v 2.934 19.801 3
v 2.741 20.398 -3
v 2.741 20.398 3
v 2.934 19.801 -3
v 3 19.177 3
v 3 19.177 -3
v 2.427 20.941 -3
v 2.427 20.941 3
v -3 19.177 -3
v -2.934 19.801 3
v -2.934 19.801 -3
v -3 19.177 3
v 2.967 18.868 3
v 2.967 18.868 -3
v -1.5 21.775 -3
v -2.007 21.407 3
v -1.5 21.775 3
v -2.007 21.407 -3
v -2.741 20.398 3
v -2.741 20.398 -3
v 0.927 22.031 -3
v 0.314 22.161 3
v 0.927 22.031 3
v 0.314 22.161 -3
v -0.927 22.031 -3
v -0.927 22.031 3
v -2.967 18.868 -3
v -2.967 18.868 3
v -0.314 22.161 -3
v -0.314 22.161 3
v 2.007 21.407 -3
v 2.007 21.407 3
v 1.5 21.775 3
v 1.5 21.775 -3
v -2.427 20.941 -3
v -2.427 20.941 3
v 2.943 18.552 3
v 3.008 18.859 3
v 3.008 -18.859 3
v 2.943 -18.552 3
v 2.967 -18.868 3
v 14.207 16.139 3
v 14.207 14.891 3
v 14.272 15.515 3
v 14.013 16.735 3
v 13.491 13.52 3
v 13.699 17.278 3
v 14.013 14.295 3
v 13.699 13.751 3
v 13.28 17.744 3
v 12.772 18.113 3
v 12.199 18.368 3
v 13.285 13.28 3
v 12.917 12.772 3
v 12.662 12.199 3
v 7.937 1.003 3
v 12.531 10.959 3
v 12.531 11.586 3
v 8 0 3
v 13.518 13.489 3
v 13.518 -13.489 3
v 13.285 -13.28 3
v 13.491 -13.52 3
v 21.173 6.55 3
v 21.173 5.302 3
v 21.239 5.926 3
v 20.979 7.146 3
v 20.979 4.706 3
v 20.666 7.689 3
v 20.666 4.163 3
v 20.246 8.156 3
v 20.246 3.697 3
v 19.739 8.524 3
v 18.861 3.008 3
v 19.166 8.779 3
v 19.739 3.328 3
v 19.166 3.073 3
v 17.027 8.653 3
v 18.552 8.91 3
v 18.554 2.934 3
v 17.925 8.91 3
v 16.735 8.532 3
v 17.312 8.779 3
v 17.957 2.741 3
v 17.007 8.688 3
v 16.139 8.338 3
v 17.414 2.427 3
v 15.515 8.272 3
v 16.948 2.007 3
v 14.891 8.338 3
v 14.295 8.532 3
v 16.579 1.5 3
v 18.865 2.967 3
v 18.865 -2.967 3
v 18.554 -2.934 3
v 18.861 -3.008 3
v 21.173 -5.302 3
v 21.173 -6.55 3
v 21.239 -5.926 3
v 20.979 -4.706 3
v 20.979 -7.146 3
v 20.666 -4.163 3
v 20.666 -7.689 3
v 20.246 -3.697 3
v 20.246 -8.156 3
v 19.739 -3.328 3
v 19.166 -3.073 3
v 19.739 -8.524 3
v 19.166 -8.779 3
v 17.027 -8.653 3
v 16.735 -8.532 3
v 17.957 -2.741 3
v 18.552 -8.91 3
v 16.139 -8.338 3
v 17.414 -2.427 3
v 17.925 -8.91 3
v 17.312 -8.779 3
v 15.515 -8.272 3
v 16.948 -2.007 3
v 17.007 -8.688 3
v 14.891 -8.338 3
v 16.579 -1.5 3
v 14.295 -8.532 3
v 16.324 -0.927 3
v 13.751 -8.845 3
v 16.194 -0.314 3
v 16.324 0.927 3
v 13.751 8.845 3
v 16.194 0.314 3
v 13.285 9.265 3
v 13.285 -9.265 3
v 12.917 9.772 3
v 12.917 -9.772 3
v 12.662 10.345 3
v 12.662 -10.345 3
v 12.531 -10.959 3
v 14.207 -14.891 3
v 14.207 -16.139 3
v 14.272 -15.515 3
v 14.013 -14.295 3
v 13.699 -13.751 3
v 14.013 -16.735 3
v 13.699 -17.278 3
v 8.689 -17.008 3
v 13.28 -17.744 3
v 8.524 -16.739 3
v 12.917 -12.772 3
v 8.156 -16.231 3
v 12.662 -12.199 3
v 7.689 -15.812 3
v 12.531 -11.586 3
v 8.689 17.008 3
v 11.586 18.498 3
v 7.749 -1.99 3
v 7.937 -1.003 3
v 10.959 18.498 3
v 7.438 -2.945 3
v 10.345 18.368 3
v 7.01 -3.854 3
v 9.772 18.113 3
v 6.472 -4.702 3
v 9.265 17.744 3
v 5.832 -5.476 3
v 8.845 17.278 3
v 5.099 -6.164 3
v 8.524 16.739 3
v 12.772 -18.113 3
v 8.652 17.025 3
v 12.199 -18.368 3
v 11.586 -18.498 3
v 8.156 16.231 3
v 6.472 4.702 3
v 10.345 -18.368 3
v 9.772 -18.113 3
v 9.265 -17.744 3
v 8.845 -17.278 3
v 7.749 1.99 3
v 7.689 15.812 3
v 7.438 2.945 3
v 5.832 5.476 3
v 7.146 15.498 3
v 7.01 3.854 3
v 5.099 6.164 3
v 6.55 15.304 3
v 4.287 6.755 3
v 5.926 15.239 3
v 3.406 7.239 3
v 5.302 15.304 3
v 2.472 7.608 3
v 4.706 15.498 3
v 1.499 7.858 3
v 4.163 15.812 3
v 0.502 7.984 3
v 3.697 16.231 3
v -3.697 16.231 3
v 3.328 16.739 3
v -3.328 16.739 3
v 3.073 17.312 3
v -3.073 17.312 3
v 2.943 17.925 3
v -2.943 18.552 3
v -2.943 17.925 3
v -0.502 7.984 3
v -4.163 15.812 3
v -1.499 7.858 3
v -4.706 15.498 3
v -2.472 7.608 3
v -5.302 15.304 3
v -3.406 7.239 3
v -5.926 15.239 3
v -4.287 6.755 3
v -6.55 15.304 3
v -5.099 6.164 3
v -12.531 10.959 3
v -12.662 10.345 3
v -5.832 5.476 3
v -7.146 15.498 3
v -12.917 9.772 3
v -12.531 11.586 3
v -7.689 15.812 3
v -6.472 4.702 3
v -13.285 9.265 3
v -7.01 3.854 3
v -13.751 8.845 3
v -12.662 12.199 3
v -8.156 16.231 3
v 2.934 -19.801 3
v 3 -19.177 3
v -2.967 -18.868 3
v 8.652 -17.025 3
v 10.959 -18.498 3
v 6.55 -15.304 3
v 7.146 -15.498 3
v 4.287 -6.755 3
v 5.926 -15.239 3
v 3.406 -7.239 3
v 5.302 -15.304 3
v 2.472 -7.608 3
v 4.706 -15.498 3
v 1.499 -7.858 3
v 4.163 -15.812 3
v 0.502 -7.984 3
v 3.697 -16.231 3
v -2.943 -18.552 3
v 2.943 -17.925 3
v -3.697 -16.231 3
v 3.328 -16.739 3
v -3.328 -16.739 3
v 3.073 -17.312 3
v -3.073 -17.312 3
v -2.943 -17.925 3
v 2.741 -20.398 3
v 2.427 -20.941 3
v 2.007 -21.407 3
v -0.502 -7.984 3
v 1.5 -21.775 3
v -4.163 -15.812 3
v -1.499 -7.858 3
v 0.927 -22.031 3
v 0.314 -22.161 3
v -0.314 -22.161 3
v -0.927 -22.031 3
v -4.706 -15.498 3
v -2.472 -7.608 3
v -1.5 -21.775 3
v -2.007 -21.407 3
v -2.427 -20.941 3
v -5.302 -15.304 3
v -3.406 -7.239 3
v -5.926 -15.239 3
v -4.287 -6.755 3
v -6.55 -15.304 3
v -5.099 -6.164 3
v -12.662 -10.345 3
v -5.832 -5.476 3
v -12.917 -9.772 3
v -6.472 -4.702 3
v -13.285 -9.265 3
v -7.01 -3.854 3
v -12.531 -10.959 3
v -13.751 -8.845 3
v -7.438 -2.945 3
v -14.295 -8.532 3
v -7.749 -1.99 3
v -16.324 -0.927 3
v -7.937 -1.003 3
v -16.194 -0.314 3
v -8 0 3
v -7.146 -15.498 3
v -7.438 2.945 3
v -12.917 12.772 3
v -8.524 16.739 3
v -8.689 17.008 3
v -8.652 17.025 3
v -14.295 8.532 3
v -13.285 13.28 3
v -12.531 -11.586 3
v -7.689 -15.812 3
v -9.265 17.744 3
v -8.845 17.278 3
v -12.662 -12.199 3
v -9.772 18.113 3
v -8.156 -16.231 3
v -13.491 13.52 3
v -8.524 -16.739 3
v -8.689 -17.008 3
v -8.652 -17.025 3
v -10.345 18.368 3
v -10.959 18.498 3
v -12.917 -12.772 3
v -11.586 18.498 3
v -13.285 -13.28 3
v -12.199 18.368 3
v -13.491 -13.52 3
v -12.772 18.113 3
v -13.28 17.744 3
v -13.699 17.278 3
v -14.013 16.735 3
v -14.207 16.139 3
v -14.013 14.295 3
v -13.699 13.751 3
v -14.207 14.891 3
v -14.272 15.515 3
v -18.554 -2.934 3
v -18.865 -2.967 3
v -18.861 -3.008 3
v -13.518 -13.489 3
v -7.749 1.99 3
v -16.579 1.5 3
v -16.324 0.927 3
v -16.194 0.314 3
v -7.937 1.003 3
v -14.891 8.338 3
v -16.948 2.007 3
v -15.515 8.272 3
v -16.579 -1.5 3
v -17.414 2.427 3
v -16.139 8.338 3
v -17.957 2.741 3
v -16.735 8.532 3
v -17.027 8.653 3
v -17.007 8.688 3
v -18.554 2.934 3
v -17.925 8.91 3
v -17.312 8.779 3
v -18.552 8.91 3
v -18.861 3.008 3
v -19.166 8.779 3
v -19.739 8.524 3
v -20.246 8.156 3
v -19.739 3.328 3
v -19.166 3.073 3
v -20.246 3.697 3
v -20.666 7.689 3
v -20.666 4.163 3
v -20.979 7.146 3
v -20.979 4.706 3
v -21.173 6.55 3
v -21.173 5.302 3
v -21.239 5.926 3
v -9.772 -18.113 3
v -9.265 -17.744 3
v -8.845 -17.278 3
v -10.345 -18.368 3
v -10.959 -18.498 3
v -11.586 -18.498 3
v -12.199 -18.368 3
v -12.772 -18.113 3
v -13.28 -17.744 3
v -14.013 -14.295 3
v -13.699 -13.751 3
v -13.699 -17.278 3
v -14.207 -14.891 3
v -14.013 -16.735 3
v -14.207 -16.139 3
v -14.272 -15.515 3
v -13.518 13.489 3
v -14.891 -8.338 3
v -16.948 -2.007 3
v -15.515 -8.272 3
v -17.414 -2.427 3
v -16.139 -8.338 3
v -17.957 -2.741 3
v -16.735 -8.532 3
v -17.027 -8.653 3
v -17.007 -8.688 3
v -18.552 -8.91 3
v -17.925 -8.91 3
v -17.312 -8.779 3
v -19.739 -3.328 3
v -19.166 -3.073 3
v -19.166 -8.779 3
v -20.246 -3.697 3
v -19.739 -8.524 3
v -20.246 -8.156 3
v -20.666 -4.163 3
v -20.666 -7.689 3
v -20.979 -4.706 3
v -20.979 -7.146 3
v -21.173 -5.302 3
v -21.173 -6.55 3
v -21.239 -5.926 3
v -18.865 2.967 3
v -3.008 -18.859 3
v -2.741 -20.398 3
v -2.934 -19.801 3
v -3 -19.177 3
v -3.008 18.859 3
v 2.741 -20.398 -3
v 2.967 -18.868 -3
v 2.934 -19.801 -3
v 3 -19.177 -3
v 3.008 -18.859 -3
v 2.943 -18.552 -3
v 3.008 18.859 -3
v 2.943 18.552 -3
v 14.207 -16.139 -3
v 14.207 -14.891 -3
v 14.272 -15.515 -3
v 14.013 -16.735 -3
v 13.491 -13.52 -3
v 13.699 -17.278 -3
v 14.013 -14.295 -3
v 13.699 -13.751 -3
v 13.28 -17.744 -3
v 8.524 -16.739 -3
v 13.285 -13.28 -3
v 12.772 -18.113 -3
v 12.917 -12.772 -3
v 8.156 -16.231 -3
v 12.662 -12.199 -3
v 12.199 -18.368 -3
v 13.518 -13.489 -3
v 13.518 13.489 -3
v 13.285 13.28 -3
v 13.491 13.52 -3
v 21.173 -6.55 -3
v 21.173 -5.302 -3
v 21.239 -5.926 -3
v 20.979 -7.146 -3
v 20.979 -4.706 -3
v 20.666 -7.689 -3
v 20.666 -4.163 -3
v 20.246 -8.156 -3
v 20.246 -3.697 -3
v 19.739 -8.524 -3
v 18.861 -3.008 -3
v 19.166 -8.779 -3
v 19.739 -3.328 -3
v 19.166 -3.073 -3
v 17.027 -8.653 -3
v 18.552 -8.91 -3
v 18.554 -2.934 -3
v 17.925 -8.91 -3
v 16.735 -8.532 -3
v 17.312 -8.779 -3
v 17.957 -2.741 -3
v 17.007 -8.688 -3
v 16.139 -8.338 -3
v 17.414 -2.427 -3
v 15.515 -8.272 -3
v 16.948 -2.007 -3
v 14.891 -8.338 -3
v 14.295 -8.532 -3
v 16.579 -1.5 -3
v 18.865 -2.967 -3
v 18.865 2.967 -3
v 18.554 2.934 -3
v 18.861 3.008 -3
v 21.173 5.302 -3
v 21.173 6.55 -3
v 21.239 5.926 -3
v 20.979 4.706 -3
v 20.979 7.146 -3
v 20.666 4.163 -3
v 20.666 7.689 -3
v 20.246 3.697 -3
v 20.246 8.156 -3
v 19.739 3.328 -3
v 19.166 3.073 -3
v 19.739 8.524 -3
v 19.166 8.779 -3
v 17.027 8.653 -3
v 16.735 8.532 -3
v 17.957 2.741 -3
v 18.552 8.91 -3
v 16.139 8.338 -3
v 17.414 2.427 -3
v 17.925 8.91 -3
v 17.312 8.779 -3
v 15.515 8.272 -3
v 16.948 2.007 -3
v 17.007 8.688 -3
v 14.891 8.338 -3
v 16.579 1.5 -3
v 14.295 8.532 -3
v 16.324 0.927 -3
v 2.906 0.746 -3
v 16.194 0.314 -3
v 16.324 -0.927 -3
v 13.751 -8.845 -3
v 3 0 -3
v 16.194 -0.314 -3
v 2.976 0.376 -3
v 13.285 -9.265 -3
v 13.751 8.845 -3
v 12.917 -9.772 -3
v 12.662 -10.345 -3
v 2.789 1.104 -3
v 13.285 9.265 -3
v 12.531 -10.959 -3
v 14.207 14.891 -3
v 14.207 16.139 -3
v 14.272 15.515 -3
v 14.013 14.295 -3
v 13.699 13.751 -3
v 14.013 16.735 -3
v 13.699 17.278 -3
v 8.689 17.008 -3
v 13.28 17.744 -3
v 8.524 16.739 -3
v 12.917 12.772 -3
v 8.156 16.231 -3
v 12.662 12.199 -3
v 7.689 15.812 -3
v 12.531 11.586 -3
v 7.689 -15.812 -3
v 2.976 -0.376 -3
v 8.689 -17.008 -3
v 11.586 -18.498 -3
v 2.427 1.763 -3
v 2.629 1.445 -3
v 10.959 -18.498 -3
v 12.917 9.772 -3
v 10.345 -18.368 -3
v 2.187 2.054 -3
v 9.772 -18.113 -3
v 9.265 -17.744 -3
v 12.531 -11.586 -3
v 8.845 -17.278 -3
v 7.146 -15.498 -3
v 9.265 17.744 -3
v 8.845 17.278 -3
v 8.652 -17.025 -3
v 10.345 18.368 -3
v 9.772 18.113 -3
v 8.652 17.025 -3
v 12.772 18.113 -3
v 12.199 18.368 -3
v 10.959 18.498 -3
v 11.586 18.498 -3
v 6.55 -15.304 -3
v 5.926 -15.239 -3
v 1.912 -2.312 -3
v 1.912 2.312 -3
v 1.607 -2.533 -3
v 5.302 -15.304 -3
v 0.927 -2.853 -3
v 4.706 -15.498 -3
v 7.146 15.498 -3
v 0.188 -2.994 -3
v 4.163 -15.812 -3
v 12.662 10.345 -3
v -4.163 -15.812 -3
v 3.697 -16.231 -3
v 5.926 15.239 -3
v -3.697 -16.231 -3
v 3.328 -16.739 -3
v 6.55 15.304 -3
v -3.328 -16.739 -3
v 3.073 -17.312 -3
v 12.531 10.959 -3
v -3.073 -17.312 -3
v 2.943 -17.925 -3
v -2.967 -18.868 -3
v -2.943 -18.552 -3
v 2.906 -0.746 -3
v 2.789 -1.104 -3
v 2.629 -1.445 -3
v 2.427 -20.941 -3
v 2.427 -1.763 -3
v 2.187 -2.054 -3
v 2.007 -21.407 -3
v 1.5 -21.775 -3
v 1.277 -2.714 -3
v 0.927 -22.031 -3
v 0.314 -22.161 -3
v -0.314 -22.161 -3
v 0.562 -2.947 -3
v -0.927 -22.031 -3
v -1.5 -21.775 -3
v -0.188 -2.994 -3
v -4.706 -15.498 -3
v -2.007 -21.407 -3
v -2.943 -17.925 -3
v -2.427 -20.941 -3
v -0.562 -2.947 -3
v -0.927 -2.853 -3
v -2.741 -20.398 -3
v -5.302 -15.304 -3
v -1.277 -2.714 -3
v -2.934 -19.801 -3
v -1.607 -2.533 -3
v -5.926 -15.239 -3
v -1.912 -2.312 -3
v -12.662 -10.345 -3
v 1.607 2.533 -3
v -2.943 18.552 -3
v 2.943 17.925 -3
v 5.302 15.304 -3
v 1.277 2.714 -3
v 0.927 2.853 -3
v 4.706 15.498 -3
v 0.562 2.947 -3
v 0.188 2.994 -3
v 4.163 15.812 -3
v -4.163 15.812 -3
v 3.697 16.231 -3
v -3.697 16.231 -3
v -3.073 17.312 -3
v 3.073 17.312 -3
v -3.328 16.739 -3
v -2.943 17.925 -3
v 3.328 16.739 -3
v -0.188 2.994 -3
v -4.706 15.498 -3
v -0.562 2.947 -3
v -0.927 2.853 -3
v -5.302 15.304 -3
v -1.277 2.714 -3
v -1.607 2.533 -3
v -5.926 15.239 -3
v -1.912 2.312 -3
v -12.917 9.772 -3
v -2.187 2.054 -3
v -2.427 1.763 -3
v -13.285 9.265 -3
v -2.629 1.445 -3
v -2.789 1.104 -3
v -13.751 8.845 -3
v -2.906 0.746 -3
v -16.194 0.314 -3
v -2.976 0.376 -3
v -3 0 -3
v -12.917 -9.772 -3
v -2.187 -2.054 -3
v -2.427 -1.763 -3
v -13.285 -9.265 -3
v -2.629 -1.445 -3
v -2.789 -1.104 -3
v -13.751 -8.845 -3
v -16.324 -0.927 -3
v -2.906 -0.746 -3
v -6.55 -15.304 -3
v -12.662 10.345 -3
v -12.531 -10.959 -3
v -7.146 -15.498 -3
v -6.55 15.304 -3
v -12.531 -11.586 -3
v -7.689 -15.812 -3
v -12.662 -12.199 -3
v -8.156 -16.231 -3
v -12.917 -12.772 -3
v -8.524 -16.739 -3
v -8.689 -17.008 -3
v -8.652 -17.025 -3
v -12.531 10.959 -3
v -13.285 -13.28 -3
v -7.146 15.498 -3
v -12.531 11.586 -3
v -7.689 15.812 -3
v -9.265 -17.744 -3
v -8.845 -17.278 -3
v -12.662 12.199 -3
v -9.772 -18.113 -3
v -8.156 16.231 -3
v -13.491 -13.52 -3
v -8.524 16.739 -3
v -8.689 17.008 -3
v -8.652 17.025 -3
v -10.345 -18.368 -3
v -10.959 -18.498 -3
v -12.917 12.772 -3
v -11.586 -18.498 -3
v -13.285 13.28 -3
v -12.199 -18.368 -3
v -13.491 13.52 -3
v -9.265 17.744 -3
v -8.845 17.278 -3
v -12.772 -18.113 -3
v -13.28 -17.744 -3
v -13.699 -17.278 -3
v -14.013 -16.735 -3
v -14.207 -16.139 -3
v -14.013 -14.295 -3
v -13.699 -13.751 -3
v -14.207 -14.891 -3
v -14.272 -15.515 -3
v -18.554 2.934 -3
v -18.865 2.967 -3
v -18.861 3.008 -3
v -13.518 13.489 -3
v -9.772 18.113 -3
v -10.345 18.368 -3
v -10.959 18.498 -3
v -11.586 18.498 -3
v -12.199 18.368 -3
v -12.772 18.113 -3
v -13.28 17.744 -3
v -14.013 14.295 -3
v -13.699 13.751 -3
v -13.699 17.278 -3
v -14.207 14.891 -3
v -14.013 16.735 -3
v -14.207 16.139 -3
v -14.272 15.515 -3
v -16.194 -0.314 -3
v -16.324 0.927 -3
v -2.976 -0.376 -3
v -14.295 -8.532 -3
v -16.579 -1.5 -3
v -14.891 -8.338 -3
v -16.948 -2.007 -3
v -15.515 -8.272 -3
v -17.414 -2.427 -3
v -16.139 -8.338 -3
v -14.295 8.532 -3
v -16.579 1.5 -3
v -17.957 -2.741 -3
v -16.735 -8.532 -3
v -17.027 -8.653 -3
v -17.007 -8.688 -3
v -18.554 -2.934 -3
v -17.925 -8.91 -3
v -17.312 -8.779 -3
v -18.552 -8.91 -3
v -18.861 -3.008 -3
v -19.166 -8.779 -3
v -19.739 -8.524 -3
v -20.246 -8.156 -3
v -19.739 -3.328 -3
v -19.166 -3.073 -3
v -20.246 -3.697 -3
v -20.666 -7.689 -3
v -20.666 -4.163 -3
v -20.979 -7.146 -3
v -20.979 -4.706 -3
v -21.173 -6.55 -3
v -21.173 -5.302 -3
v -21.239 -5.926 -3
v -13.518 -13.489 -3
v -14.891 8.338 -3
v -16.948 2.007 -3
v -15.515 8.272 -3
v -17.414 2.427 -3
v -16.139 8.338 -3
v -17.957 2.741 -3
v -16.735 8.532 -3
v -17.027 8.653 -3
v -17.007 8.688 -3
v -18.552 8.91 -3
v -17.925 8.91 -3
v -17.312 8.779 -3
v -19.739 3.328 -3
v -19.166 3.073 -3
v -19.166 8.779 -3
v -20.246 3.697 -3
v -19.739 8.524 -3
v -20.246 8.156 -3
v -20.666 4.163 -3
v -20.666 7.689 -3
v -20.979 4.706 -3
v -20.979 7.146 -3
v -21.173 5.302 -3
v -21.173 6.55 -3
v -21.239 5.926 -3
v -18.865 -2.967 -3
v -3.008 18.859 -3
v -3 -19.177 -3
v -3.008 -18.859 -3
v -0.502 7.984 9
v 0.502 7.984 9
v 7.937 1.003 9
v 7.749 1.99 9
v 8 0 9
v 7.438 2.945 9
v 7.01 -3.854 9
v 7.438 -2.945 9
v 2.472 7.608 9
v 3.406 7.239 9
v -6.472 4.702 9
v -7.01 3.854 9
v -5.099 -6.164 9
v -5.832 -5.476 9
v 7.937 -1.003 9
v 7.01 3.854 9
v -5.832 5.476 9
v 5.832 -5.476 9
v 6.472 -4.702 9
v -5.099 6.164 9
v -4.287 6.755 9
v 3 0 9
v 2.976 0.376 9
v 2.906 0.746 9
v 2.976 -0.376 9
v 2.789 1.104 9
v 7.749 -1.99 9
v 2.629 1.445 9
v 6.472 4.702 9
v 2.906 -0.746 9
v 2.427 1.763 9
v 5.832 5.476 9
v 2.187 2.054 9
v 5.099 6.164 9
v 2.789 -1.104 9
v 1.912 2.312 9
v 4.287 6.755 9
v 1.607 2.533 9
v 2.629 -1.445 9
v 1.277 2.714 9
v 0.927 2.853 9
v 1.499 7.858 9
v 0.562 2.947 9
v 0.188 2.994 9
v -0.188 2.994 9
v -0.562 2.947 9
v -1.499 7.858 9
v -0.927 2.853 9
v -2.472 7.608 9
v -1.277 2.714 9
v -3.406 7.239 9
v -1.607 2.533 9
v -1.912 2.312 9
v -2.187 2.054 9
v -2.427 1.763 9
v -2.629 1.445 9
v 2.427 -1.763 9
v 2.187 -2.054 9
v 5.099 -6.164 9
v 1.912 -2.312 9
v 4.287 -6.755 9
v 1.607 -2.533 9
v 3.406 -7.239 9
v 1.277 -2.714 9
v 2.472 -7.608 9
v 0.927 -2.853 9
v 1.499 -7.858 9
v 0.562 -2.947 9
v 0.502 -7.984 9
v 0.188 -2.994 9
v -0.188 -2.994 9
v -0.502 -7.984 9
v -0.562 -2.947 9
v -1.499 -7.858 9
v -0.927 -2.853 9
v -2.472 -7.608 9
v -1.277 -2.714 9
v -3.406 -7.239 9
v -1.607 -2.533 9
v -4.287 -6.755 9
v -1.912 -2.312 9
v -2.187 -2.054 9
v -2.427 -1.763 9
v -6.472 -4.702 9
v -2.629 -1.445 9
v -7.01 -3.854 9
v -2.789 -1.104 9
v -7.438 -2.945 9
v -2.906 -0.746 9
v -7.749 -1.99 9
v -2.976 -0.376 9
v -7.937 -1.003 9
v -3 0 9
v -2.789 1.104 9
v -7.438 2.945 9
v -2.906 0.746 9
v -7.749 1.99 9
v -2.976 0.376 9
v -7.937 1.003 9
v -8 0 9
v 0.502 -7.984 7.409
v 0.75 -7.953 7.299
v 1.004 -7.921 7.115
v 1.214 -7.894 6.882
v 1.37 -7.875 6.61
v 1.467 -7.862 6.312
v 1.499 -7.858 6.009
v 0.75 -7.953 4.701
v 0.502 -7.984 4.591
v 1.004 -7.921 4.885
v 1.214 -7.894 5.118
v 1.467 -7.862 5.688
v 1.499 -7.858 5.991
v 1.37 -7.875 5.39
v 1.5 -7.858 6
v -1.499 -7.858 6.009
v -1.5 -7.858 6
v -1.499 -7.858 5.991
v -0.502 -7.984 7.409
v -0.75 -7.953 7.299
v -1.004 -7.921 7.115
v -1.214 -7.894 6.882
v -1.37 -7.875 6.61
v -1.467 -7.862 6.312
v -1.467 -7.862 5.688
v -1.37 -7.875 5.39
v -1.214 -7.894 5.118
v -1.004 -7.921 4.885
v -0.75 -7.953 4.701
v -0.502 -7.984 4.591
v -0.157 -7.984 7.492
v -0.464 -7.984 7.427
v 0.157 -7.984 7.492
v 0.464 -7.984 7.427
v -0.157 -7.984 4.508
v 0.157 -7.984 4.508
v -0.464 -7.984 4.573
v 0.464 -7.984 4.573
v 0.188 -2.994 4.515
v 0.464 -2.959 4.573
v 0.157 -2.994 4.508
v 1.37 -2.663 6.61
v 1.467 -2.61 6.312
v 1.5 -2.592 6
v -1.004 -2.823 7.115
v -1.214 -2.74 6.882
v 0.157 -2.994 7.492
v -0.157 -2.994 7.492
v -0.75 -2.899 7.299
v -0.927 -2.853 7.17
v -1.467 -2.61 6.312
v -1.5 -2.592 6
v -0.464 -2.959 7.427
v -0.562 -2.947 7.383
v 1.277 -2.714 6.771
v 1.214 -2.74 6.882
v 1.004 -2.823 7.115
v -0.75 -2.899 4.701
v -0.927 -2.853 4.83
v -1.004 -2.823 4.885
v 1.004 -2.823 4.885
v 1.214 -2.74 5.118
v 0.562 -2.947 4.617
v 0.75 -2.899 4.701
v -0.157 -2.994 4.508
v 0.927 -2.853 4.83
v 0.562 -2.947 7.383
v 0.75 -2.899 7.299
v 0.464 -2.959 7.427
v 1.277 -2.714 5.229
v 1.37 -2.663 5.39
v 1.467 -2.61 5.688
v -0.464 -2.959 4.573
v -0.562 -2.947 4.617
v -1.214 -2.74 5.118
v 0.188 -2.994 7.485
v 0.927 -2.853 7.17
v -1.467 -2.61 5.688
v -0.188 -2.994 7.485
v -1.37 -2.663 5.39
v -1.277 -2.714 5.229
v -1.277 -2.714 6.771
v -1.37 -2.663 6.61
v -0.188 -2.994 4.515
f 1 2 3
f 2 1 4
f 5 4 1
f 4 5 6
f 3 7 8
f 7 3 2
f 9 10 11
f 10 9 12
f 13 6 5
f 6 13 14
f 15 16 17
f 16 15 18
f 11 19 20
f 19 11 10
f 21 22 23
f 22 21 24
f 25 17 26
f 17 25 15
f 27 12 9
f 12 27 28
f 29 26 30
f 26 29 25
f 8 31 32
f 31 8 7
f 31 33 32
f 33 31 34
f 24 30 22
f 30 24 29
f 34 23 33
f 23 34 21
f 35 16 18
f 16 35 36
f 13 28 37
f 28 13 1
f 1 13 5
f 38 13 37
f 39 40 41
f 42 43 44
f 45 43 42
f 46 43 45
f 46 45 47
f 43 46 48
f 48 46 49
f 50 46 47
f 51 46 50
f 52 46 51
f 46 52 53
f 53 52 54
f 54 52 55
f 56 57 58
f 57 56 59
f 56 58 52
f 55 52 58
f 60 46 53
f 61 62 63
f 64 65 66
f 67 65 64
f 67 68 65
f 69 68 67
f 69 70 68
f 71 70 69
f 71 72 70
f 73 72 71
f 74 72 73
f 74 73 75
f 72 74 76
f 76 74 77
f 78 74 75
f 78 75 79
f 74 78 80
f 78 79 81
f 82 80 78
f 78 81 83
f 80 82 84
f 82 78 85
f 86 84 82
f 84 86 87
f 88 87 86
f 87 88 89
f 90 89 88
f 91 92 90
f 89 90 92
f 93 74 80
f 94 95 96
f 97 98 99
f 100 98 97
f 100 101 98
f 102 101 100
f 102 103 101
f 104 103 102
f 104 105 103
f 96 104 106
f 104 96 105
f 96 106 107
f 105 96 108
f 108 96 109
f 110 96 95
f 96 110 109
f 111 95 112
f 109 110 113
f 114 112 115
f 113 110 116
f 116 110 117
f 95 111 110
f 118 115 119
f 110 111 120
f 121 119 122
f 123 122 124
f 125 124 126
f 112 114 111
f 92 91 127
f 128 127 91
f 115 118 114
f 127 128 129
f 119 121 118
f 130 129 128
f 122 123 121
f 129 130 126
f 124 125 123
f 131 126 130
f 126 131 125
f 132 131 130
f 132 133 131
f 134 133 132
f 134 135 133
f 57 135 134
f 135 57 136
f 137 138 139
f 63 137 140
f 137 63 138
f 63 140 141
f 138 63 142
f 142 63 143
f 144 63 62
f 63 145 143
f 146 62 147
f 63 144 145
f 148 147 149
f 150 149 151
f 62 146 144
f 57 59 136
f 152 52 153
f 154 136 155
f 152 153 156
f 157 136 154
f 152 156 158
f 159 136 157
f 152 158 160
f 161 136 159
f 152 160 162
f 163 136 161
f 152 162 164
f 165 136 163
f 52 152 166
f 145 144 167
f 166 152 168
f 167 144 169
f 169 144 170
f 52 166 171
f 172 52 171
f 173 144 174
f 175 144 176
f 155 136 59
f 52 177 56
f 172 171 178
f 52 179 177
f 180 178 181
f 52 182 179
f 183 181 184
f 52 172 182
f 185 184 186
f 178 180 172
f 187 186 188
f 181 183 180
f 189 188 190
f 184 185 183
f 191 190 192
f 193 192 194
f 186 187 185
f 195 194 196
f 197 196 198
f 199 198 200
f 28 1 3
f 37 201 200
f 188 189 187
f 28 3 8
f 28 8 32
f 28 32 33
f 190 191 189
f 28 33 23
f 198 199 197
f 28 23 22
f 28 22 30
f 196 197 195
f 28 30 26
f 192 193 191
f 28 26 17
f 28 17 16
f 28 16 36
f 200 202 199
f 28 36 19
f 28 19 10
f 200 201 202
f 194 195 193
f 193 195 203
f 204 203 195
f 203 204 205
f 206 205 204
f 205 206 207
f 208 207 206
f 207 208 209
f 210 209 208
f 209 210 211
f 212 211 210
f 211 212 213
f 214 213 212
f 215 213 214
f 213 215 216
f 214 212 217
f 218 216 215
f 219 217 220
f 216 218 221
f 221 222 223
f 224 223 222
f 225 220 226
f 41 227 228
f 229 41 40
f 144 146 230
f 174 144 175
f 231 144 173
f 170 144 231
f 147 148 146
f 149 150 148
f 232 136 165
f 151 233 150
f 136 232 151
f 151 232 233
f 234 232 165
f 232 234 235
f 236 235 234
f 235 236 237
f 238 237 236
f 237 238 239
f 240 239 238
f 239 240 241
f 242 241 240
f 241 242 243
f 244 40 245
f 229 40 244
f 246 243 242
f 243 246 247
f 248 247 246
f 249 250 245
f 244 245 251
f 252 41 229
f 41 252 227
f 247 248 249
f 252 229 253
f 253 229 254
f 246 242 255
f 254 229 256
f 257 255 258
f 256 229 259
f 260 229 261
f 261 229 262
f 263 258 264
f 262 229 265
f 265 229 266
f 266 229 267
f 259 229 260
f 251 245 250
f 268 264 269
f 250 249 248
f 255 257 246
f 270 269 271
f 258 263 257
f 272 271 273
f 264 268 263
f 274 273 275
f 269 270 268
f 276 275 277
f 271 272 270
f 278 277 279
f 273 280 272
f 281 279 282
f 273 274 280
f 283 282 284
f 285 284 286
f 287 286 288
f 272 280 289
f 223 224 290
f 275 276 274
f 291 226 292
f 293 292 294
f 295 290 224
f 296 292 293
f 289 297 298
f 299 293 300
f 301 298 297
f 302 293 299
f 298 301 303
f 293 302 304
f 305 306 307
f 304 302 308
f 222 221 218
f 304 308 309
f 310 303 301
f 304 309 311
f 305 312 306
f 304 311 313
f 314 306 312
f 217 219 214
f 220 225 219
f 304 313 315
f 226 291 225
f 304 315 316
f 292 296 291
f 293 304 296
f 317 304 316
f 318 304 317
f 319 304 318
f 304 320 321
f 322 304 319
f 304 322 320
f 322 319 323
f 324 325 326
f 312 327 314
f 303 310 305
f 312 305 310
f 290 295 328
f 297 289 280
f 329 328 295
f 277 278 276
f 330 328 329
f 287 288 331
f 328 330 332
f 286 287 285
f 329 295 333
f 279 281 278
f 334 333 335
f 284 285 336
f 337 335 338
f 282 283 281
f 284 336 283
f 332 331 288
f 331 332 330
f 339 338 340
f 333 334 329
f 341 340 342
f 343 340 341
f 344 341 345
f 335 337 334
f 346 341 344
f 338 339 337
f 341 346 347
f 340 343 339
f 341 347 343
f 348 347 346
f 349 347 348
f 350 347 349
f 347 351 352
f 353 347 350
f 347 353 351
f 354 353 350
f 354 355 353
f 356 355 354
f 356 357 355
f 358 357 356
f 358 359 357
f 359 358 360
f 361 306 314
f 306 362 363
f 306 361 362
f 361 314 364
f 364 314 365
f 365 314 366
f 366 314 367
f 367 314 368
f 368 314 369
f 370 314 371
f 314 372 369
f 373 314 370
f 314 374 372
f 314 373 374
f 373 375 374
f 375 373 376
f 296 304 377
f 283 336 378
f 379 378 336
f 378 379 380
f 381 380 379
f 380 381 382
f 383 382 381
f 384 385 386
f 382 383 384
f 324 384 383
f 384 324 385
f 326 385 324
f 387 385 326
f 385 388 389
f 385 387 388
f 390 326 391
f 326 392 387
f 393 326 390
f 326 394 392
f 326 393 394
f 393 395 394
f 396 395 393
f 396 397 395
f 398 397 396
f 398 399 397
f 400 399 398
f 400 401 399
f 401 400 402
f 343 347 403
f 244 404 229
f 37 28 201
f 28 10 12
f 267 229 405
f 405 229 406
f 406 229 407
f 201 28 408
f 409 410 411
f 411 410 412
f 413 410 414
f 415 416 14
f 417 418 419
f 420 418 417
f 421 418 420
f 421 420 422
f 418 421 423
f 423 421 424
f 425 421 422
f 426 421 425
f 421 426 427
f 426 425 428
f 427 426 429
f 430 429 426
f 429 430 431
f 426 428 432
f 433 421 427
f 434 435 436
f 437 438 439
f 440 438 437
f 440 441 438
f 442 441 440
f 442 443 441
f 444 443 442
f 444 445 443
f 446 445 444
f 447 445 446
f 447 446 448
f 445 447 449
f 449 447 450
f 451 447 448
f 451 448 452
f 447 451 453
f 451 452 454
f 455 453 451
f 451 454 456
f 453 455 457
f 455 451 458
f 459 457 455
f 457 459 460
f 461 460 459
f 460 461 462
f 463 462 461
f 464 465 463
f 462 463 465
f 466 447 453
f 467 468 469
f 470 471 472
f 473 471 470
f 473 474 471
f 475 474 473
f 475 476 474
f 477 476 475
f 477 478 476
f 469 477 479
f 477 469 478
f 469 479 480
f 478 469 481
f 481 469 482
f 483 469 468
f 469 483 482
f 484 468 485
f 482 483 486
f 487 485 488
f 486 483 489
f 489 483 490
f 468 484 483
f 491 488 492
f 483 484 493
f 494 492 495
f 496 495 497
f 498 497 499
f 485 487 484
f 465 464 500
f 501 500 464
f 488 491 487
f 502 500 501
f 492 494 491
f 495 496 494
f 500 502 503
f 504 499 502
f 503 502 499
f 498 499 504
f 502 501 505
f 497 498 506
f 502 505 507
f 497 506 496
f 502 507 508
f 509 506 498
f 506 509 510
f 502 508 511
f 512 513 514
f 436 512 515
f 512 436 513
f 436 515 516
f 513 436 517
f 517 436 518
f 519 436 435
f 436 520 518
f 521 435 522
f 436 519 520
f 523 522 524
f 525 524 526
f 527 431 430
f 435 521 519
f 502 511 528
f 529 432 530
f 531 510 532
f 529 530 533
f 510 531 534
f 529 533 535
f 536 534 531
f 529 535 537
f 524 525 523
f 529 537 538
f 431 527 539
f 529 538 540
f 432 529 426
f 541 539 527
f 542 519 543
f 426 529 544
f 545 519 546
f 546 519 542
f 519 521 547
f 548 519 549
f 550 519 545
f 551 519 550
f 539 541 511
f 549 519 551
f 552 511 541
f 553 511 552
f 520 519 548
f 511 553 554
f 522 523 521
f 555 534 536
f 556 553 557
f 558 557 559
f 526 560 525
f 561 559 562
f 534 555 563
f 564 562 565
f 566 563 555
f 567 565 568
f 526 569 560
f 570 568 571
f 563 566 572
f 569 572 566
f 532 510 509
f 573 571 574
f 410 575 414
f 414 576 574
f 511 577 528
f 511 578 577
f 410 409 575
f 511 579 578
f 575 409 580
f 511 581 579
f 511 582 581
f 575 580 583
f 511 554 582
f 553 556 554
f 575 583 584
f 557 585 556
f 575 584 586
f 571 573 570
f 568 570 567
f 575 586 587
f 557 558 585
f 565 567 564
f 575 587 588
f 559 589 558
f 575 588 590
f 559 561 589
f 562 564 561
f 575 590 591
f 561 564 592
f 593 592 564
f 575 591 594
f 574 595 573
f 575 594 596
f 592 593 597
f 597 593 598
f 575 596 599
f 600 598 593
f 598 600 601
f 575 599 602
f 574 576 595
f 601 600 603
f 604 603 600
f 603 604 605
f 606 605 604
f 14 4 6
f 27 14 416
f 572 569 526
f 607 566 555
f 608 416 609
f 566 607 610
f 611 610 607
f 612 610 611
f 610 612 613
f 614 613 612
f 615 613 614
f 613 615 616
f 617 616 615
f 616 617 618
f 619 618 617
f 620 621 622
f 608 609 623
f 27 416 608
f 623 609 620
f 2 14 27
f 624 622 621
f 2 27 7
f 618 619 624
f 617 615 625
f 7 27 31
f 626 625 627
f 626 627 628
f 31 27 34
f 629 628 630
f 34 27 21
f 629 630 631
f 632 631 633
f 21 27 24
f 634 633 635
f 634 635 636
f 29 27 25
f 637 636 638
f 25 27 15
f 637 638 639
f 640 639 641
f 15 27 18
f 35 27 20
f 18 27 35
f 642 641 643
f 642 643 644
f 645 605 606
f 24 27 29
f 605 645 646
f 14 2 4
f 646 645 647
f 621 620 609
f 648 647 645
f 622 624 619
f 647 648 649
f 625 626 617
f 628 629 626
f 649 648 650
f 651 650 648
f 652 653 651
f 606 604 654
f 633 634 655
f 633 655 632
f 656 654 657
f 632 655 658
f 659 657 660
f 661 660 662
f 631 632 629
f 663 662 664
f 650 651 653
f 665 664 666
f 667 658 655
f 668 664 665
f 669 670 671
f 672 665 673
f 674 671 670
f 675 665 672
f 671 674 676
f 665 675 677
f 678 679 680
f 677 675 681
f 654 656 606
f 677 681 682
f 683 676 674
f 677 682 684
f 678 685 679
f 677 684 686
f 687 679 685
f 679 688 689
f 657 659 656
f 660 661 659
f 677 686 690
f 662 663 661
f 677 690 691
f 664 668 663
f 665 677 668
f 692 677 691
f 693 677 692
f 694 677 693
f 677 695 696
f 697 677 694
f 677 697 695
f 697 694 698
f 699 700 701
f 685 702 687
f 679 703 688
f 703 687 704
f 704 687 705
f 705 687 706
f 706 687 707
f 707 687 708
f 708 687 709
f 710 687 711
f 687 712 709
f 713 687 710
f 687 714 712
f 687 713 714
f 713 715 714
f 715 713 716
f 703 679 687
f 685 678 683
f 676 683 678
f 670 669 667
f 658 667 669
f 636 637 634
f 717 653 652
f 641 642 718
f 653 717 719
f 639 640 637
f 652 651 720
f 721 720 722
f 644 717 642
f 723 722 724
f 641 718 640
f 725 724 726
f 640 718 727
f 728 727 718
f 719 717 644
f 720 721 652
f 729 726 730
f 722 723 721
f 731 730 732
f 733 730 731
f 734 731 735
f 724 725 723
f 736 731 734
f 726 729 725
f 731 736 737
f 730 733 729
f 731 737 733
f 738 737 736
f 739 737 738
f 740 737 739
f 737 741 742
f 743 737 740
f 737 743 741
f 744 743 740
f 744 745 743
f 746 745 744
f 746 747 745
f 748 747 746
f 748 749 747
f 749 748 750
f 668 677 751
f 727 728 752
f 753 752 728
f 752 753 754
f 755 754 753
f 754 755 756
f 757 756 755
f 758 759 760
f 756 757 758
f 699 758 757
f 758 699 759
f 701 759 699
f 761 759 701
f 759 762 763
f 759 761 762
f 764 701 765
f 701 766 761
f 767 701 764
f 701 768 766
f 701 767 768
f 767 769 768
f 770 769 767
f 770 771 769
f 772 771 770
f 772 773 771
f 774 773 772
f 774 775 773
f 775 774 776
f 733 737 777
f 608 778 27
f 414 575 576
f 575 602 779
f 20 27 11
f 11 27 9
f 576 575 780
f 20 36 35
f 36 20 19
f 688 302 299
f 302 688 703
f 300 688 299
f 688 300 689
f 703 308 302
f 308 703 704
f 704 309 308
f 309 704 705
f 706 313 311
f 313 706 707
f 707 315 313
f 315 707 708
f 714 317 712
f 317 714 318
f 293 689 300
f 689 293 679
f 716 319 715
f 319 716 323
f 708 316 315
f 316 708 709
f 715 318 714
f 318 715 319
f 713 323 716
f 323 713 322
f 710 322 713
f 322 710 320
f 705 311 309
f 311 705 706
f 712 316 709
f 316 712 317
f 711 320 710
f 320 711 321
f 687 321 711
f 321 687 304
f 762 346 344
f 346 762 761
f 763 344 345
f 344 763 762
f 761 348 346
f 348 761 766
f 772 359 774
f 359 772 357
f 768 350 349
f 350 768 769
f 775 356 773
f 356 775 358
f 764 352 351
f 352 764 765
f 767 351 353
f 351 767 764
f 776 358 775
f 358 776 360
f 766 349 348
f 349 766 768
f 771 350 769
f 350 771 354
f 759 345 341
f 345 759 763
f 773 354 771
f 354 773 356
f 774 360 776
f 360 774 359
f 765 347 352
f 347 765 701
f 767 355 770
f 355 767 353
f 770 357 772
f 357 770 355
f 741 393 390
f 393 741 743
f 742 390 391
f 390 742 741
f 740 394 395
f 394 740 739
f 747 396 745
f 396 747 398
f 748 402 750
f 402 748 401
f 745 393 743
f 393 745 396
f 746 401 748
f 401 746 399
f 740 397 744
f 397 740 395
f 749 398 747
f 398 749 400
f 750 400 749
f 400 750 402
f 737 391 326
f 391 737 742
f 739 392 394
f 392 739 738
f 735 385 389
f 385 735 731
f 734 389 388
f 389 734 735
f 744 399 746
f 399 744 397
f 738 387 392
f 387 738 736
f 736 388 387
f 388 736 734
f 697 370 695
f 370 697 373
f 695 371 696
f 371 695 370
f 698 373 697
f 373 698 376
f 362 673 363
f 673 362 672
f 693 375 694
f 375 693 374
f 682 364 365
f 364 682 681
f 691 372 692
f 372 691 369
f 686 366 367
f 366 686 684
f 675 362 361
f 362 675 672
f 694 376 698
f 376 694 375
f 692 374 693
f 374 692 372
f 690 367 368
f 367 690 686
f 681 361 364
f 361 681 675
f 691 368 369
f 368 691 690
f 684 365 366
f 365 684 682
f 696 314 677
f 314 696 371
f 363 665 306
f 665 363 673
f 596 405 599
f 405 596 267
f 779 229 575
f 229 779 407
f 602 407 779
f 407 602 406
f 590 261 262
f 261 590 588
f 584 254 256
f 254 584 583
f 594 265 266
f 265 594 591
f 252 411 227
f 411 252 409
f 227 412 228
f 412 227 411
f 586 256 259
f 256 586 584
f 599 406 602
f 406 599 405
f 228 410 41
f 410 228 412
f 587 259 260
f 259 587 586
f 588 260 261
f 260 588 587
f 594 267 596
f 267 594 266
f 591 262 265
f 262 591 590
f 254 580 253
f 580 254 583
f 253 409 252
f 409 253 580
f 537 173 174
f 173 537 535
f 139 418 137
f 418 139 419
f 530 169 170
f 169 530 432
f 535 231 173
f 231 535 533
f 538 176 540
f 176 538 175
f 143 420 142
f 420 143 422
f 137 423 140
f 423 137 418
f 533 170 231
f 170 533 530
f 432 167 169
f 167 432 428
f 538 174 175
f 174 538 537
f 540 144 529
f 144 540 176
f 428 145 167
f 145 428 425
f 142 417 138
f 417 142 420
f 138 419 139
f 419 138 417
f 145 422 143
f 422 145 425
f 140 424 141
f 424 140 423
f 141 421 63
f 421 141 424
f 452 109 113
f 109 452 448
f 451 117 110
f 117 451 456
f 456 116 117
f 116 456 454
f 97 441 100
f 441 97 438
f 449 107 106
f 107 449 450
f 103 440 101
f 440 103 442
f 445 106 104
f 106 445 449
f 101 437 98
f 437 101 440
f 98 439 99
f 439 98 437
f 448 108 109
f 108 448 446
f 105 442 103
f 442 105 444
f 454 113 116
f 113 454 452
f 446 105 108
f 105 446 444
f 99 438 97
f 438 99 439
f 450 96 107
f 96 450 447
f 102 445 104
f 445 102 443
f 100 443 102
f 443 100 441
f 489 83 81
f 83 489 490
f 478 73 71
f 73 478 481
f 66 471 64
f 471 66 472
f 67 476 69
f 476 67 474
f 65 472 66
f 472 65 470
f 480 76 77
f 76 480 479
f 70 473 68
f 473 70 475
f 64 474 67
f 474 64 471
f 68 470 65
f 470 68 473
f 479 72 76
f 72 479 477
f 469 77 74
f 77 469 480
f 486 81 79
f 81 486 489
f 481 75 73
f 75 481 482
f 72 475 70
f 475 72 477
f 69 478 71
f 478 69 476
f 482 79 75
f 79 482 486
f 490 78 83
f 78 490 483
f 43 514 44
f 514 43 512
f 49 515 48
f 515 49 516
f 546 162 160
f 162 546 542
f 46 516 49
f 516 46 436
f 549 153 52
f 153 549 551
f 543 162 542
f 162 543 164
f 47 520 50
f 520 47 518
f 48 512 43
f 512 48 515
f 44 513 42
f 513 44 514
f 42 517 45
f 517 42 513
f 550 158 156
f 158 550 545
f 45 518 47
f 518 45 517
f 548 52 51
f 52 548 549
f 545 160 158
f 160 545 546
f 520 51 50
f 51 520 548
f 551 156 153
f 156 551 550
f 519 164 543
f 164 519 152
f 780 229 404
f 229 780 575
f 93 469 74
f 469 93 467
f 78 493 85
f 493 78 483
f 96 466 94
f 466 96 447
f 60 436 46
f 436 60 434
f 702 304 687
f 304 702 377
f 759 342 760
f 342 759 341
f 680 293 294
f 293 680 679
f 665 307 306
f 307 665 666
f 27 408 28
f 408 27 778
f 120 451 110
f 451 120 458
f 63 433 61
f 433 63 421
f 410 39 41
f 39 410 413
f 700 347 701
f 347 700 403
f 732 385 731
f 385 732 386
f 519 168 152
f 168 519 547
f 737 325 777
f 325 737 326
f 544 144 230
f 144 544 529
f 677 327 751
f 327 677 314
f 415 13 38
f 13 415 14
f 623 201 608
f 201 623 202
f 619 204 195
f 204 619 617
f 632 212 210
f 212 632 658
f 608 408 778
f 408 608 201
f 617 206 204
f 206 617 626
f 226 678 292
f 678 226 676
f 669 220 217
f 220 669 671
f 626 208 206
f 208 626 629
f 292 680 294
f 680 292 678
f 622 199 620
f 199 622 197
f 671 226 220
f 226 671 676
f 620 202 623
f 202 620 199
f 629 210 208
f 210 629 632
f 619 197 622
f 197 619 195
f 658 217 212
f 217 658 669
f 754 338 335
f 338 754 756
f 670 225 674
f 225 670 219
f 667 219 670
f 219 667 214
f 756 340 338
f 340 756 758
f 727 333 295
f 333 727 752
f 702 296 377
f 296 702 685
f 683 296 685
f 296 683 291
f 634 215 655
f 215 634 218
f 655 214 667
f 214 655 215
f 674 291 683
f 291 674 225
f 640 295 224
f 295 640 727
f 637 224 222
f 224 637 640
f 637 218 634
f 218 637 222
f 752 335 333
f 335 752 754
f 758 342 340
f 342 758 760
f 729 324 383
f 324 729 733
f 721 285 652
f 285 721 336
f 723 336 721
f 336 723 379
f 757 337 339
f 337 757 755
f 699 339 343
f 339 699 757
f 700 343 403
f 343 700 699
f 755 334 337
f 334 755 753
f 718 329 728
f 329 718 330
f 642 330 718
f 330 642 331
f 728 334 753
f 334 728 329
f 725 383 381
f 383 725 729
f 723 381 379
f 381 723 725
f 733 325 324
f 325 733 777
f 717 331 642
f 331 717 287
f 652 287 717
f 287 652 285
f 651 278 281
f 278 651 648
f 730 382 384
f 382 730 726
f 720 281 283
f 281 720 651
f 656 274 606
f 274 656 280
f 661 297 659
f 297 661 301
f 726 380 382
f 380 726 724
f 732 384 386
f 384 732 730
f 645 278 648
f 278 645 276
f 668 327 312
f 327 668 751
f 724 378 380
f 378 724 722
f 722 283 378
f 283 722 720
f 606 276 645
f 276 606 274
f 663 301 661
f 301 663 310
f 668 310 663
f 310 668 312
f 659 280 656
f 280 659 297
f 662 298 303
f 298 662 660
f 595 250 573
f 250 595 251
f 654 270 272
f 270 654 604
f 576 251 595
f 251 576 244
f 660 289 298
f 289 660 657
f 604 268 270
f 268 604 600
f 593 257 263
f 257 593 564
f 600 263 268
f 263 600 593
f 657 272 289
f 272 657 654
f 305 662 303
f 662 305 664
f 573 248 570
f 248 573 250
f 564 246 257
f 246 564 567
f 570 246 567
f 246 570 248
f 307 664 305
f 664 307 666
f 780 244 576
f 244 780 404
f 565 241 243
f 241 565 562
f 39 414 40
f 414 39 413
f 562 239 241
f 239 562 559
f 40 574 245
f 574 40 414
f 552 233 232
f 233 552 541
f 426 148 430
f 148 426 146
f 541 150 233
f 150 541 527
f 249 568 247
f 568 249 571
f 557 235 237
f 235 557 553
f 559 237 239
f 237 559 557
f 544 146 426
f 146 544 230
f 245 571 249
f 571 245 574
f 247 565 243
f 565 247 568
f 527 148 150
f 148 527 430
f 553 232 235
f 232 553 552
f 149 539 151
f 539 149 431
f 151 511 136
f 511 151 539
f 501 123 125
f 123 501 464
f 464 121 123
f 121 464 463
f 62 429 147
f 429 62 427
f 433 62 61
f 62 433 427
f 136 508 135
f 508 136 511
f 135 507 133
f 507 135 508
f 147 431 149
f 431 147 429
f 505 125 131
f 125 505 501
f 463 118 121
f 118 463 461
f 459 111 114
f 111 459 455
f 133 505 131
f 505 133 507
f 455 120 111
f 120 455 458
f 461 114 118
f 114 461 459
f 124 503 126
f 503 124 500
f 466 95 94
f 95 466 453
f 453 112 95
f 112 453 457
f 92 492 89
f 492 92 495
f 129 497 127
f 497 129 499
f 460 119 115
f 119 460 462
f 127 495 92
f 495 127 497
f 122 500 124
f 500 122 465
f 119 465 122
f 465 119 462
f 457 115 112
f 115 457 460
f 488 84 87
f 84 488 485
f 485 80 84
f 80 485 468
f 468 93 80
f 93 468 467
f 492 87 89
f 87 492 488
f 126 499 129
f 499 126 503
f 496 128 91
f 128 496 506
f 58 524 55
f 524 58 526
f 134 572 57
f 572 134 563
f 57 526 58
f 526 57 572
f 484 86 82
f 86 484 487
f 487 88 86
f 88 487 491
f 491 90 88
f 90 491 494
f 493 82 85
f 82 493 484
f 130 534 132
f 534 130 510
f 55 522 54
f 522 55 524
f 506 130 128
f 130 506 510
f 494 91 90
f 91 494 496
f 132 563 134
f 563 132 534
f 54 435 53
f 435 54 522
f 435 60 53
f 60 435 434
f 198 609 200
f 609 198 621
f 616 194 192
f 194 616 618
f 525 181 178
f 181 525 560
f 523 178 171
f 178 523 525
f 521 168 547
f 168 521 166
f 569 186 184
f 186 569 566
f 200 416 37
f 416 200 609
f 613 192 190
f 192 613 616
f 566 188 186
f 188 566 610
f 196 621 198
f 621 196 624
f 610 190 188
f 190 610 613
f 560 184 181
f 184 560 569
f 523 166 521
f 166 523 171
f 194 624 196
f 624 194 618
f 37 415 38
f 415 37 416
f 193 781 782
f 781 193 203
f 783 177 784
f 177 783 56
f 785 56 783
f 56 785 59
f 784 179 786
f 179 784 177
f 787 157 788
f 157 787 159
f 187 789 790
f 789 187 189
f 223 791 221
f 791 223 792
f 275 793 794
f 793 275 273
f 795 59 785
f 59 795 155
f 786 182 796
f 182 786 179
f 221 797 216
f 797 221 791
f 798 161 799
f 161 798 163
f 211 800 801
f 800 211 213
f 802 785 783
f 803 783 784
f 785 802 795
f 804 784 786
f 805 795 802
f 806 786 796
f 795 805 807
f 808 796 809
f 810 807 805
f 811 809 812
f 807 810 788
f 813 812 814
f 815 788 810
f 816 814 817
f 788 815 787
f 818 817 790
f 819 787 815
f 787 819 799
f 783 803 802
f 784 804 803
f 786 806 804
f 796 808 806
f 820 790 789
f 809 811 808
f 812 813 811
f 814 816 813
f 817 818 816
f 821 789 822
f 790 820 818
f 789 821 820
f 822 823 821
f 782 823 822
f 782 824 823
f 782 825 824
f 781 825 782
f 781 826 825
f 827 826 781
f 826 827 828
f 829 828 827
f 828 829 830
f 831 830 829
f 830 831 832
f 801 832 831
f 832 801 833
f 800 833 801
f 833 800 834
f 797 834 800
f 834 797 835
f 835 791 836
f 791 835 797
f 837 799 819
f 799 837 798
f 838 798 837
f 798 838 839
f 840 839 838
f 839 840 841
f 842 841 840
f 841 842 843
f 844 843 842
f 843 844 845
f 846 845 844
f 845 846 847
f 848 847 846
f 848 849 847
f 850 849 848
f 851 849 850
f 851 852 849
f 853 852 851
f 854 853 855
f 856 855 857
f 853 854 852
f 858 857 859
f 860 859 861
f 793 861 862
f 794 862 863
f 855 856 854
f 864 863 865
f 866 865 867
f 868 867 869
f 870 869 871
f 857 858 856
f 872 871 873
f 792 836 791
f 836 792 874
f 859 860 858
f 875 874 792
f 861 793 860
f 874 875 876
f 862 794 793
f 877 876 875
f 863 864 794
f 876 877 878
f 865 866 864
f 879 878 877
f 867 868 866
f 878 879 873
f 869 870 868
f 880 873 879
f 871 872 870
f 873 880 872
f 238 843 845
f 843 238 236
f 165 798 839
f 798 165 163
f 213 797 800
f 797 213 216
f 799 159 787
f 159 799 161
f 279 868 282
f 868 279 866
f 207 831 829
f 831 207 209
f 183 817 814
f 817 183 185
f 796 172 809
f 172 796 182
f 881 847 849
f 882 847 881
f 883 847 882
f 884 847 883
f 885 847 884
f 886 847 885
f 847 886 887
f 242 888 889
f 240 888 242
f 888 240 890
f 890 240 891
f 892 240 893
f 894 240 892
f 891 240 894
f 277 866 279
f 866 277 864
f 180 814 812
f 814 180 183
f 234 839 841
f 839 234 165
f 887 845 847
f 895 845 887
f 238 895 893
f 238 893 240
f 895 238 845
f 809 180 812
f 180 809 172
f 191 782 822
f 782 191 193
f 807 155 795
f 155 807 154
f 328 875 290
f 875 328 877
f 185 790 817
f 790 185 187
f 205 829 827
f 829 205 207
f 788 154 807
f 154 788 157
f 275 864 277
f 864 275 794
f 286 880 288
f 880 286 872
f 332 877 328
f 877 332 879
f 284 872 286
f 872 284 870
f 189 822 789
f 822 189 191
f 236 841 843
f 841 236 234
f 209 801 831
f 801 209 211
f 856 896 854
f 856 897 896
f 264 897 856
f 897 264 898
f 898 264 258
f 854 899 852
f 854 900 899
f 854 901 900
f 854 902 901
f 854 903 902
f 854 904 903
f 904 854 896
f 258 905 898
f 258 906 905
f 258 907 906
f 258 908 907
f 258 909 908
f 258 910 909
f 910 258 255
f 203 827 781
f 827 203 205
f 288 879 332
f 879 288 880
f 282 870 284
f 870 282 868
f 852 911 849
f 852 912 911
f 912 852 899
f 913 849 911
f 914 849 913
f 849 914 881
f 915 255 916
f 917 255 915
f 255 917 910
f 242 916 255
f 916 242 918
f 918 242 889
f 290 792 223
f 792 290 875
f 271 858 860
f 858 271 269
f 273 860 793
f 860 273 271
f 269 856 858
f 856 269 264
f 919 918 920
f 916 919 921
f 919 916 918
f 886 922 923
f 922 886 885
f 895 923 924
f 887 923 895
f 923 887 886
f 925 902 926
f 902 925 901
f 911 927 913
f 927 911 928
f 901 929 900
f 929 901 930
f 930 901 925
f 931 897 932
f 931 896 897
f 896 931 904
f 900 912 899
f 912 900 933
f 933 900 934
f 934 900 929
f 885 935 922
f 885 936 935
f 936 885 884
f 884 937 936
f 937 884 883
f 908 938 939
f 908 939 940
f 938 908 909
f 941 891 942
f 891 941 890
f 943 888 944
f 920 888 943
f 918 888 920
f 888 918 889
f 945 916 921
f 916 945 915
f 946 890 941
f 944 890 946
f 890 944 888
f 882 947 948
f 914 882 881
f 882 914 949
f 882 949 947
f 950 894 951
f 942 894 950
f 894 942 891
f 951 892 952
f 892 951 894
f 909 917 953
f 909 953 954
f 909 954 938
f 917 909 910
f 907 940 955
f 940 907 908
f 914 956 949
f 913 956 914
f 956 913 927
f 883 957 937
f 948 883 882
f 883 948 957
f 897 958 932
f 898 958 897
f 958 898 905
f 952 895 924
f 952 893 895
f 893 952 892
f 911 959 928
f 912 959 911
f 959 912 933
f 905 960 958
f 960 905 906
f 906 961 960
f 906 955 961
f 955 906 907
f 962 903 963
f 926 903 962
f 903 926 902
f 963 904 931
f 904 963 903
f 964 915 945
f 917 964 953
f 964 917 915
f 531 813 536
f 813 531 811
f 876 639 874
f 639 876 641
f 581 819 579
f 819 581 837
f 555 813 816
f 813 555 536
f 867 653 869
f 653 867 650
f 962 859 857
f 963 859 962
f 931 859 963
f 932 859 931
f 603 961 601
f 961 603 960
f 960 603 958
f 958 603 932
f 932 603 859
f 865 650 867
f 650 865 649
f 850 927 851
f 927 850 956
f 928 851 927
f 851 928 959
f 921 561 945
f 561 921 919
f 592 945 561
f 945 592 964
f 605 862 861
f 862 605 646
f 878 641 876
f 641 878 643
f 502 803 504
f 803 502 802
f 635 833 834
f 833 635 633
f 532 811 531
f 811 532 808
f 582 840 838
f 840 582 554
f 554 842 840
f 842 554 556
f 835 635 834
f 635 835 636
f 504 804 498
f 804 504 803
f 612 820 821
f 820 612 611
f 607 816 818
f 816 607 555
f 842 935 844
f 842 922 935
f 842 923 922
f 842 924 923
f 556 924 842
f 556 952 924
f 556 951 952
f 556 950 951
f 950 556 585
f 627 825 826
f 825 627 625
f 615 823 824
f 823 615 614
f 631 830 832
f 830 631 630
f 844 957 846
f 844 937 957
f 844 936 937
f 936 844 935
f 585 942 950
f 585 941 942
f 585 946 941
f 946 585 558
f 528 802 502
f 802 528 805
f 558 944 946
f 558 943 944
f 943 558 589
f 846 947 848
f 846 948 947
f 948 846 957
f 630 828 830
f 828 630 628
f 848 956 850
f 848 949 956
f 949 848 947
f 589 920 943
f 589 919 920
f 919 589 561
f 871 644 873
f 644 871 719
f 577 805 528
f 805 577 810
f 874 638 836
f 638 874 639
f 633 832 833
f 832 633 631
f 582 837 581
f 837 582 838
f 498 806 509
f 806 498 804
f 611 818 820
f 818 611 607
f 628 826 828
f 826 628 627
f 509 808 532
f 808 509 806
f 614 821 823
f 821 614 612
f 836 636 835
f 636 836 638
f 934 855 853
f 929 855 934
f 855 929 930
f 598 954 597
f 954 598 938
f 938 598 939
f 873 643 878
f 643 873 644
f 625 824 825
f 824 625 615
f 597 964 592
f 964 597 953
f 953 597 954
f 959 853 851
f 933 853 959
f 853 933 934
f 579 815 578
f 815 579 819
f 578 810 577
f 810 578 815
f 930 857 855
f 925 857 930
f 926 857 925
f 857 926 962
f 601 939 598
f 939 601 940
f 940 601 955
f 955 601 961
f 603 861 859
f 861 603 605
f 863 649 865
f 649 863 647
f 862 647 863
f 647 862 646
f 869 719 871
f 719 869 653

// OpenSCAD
/*[COG]*/

// total amount of teeth
teethCount = 10; // [4:1:100]

// diameter of each tooth
toothDiameter = 3; // [0.5:0.1:10]

// polygon resoultion
geometryResolution = 30; // [20:1:100]

// correction parameter to slightly adjust the space between the teeth
spaceBetweenTeeth = 0; // [0:0.1:2]

// cog height or thickness
thickness = 6; // [1:0.5:100]

/* [Axis Hole] */

// what kind of axis do you want to use
axisType = "hole"; // [hole:round hole,four:4 corner axis,five:5 corner axis,six:6 corner axis]

// round hole radius
holeRadius = 6; // [0:0.1:50]

/* [Axis Fix] */

// axis fix size radius
axisFixRadius = 8; // [1:0.5:100]

// axis fix size height
axisFixHeight = 10; // [1:0.5:100]

// axis fix offsset (default is centered)
axisFixOffset = 4; // [0:0.5:100]

/* [Screw Fix] */

// radius of the screw hole to fix the cog (default is 1.5 for 3mm screw)
axisFixScrewHoleRadisu = 1.5; // [0.1:0.1:10]

// offset to where the screw hole should be (default is 0 which is the center of the cog's height)
axisFixScrewHoleOffset = 6; // [0:0.1:100]

/* [Hidden] */

cog(teethCount,toothDiameter,spaceBetweenTeeth,thickness,holeRadius);
module cog(tooth_count,tooth_diameter,space_between_teeth,height,holeDiameter){
    
    res=geometryResolution;
    cogSegment = tooth_diameter;       
    angle = 360/(tooth_count*4);    
    radius = cogSegment/sin(angle);
	difference(){		
		difference(){
			union(){
				difference(){
					difference(){
						union(){
							cylinder(h = height,r=radius, center = true, $fn=res);
							for(r=[0 : 360/tooth_count : 360]){
								rotate([0,0,r]) translate([0,radius,0]) cylinder(h = height,r=tooth_diameter-(space_between_teeth/2), center = true,$fn=res);
							}
						}    
						rotate([0,0,(360/tooth_count)/2]){
							for(r=[0 : 360/tooth_count : 360]){
								rotate([0,0,r]) translate([0,radius,0]) cylinder(h = height+4,r=tooth_diameter+(space_between_teeth/2), center = true,$fn=res);
							}    
						}
					}
	
				}
				// axis fix
				translate([0,0,axisFixOffset]) cylinder(h = axisFixHeight,r=axisFixRadius, center = true, $fn=50);							
			}
			//screw hole fixature
			rotate([90,0,0]) translate([0,axisFixScrewHoleOffset,(radius+10)/2]) cylinder(h = radius+10,r=axisFixScrewHoleRadisu, center = true,$fn=res);
		}
		ha = axisFixHeight+ height +10;
		if (axisType == "hole") {
			cylinder(h = ha,r=(holeDiameter/2), center = true,$fn=50);			
		}else if(axisType == "four"){
			rotate([0,0,45]) cylinder(h = ha,r=(holeDiameter/2), center = true,$fn=4);
		}else if(axisType == "five"){
			rotate([0,0,20]) cylinder(h = ha,r=(holeDiameter/2), center = true,$fn=5);
		}else if(axisType == "six"){
			rotate([0,0,0]) cylinder(h = ha,r=(holeDiameter/2), center = true,$fn=6);
		}
	}	
}
